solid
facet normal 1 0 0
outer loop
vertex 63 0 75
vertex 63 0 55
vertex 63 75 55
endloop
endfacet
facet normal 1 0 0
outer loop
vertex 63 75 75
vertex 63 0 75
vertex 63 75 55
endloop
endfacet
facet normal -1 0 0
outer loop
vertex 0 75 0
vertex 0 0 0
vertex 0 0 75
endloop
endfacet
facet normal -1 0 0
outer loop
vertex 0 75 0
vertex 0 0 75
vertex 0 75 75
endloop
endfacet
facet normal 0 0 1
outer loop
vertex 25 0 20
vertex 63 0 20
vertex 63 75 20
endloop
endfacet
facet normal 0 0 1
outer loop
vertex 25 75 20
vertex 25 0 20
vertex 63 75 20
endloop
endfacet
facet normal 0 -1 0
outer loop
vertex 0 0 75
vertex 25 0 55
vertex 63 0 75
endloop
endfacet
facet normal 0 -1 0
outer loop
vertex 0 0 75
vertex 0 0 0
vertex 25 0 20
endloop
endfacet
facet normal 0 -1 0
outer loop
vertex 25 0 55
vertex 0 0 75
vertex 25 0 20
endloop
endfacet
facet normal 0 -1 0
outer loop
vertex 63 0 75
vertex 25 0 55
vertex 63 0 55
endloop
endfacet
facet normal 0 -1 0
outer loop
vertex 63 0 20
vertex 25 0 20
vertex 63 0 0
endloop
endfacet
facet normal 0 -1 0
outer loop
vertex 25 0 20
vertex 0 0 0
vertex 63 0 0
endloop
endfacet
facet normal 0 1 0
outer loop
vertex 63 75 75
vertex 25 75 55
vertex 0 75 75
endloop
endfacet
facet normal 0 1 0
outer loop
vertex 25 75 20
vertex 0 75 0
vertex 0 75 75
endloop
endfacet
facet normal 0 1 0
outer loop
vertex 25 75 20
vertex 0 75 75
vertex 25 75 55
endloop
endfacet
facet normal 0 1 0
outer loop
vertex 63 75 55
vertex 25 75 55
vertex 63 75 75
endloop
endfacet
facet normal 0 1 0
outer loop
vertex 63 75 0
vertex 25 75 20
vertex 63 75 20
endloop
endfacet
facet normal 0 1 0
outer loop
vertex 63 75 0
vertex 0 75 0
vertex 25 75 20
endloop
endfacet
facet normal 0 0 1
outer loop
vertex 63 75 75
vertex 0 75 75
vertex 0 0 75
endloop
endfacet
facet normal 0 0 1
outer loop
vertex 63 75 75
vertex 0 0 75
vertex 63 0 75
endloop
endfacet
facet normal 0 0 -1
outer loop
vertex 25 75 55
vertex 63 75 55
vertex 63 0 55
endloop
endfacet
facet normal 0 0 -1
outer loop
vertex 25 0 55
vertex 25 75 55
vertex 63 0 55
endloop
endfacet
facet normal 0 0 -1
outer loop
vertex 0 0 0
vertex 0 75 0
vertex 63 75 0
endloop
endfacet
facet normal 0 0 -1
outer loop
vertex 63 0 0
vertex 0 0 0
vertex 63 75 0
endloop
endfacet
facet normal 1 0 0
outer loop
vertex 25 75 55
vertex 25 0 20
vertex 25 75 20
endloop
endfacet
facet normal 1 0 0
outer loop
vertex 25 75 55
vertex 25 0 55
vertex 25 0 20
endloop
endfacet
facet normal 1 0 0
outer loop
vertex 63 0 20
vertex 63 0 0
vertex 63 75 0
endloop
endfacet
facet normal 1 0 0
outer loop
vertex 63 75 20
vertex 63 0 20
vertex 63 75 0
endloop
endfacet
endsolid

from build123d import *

# Parameters (mm, degrees)
F0_W     = 63
F0_H     = 75
F1_DEPTH = 75
F3_DEPTH = 38


with BuildPart() as f1:
    # F0 (on Top) → F1 (new body)
    with BuildSketch(Plane.XY):
        with Locations((31.5, 37.5)):
            Rectangle(F0_W, F0_H)
    extrude(amount=F1_DEPTH)

    # F2 (on face) → F3 (cut)
    with BuildSketch(Plane.YZ.offset(63)):
        Polygon((0, 20), (37.5, 20), (75, 20), (75, 55), (0, 55), align=None)
    extrude(amount=-F3_DEPTH, mode=Mode.SUBTRACT)


solid = f1.part
